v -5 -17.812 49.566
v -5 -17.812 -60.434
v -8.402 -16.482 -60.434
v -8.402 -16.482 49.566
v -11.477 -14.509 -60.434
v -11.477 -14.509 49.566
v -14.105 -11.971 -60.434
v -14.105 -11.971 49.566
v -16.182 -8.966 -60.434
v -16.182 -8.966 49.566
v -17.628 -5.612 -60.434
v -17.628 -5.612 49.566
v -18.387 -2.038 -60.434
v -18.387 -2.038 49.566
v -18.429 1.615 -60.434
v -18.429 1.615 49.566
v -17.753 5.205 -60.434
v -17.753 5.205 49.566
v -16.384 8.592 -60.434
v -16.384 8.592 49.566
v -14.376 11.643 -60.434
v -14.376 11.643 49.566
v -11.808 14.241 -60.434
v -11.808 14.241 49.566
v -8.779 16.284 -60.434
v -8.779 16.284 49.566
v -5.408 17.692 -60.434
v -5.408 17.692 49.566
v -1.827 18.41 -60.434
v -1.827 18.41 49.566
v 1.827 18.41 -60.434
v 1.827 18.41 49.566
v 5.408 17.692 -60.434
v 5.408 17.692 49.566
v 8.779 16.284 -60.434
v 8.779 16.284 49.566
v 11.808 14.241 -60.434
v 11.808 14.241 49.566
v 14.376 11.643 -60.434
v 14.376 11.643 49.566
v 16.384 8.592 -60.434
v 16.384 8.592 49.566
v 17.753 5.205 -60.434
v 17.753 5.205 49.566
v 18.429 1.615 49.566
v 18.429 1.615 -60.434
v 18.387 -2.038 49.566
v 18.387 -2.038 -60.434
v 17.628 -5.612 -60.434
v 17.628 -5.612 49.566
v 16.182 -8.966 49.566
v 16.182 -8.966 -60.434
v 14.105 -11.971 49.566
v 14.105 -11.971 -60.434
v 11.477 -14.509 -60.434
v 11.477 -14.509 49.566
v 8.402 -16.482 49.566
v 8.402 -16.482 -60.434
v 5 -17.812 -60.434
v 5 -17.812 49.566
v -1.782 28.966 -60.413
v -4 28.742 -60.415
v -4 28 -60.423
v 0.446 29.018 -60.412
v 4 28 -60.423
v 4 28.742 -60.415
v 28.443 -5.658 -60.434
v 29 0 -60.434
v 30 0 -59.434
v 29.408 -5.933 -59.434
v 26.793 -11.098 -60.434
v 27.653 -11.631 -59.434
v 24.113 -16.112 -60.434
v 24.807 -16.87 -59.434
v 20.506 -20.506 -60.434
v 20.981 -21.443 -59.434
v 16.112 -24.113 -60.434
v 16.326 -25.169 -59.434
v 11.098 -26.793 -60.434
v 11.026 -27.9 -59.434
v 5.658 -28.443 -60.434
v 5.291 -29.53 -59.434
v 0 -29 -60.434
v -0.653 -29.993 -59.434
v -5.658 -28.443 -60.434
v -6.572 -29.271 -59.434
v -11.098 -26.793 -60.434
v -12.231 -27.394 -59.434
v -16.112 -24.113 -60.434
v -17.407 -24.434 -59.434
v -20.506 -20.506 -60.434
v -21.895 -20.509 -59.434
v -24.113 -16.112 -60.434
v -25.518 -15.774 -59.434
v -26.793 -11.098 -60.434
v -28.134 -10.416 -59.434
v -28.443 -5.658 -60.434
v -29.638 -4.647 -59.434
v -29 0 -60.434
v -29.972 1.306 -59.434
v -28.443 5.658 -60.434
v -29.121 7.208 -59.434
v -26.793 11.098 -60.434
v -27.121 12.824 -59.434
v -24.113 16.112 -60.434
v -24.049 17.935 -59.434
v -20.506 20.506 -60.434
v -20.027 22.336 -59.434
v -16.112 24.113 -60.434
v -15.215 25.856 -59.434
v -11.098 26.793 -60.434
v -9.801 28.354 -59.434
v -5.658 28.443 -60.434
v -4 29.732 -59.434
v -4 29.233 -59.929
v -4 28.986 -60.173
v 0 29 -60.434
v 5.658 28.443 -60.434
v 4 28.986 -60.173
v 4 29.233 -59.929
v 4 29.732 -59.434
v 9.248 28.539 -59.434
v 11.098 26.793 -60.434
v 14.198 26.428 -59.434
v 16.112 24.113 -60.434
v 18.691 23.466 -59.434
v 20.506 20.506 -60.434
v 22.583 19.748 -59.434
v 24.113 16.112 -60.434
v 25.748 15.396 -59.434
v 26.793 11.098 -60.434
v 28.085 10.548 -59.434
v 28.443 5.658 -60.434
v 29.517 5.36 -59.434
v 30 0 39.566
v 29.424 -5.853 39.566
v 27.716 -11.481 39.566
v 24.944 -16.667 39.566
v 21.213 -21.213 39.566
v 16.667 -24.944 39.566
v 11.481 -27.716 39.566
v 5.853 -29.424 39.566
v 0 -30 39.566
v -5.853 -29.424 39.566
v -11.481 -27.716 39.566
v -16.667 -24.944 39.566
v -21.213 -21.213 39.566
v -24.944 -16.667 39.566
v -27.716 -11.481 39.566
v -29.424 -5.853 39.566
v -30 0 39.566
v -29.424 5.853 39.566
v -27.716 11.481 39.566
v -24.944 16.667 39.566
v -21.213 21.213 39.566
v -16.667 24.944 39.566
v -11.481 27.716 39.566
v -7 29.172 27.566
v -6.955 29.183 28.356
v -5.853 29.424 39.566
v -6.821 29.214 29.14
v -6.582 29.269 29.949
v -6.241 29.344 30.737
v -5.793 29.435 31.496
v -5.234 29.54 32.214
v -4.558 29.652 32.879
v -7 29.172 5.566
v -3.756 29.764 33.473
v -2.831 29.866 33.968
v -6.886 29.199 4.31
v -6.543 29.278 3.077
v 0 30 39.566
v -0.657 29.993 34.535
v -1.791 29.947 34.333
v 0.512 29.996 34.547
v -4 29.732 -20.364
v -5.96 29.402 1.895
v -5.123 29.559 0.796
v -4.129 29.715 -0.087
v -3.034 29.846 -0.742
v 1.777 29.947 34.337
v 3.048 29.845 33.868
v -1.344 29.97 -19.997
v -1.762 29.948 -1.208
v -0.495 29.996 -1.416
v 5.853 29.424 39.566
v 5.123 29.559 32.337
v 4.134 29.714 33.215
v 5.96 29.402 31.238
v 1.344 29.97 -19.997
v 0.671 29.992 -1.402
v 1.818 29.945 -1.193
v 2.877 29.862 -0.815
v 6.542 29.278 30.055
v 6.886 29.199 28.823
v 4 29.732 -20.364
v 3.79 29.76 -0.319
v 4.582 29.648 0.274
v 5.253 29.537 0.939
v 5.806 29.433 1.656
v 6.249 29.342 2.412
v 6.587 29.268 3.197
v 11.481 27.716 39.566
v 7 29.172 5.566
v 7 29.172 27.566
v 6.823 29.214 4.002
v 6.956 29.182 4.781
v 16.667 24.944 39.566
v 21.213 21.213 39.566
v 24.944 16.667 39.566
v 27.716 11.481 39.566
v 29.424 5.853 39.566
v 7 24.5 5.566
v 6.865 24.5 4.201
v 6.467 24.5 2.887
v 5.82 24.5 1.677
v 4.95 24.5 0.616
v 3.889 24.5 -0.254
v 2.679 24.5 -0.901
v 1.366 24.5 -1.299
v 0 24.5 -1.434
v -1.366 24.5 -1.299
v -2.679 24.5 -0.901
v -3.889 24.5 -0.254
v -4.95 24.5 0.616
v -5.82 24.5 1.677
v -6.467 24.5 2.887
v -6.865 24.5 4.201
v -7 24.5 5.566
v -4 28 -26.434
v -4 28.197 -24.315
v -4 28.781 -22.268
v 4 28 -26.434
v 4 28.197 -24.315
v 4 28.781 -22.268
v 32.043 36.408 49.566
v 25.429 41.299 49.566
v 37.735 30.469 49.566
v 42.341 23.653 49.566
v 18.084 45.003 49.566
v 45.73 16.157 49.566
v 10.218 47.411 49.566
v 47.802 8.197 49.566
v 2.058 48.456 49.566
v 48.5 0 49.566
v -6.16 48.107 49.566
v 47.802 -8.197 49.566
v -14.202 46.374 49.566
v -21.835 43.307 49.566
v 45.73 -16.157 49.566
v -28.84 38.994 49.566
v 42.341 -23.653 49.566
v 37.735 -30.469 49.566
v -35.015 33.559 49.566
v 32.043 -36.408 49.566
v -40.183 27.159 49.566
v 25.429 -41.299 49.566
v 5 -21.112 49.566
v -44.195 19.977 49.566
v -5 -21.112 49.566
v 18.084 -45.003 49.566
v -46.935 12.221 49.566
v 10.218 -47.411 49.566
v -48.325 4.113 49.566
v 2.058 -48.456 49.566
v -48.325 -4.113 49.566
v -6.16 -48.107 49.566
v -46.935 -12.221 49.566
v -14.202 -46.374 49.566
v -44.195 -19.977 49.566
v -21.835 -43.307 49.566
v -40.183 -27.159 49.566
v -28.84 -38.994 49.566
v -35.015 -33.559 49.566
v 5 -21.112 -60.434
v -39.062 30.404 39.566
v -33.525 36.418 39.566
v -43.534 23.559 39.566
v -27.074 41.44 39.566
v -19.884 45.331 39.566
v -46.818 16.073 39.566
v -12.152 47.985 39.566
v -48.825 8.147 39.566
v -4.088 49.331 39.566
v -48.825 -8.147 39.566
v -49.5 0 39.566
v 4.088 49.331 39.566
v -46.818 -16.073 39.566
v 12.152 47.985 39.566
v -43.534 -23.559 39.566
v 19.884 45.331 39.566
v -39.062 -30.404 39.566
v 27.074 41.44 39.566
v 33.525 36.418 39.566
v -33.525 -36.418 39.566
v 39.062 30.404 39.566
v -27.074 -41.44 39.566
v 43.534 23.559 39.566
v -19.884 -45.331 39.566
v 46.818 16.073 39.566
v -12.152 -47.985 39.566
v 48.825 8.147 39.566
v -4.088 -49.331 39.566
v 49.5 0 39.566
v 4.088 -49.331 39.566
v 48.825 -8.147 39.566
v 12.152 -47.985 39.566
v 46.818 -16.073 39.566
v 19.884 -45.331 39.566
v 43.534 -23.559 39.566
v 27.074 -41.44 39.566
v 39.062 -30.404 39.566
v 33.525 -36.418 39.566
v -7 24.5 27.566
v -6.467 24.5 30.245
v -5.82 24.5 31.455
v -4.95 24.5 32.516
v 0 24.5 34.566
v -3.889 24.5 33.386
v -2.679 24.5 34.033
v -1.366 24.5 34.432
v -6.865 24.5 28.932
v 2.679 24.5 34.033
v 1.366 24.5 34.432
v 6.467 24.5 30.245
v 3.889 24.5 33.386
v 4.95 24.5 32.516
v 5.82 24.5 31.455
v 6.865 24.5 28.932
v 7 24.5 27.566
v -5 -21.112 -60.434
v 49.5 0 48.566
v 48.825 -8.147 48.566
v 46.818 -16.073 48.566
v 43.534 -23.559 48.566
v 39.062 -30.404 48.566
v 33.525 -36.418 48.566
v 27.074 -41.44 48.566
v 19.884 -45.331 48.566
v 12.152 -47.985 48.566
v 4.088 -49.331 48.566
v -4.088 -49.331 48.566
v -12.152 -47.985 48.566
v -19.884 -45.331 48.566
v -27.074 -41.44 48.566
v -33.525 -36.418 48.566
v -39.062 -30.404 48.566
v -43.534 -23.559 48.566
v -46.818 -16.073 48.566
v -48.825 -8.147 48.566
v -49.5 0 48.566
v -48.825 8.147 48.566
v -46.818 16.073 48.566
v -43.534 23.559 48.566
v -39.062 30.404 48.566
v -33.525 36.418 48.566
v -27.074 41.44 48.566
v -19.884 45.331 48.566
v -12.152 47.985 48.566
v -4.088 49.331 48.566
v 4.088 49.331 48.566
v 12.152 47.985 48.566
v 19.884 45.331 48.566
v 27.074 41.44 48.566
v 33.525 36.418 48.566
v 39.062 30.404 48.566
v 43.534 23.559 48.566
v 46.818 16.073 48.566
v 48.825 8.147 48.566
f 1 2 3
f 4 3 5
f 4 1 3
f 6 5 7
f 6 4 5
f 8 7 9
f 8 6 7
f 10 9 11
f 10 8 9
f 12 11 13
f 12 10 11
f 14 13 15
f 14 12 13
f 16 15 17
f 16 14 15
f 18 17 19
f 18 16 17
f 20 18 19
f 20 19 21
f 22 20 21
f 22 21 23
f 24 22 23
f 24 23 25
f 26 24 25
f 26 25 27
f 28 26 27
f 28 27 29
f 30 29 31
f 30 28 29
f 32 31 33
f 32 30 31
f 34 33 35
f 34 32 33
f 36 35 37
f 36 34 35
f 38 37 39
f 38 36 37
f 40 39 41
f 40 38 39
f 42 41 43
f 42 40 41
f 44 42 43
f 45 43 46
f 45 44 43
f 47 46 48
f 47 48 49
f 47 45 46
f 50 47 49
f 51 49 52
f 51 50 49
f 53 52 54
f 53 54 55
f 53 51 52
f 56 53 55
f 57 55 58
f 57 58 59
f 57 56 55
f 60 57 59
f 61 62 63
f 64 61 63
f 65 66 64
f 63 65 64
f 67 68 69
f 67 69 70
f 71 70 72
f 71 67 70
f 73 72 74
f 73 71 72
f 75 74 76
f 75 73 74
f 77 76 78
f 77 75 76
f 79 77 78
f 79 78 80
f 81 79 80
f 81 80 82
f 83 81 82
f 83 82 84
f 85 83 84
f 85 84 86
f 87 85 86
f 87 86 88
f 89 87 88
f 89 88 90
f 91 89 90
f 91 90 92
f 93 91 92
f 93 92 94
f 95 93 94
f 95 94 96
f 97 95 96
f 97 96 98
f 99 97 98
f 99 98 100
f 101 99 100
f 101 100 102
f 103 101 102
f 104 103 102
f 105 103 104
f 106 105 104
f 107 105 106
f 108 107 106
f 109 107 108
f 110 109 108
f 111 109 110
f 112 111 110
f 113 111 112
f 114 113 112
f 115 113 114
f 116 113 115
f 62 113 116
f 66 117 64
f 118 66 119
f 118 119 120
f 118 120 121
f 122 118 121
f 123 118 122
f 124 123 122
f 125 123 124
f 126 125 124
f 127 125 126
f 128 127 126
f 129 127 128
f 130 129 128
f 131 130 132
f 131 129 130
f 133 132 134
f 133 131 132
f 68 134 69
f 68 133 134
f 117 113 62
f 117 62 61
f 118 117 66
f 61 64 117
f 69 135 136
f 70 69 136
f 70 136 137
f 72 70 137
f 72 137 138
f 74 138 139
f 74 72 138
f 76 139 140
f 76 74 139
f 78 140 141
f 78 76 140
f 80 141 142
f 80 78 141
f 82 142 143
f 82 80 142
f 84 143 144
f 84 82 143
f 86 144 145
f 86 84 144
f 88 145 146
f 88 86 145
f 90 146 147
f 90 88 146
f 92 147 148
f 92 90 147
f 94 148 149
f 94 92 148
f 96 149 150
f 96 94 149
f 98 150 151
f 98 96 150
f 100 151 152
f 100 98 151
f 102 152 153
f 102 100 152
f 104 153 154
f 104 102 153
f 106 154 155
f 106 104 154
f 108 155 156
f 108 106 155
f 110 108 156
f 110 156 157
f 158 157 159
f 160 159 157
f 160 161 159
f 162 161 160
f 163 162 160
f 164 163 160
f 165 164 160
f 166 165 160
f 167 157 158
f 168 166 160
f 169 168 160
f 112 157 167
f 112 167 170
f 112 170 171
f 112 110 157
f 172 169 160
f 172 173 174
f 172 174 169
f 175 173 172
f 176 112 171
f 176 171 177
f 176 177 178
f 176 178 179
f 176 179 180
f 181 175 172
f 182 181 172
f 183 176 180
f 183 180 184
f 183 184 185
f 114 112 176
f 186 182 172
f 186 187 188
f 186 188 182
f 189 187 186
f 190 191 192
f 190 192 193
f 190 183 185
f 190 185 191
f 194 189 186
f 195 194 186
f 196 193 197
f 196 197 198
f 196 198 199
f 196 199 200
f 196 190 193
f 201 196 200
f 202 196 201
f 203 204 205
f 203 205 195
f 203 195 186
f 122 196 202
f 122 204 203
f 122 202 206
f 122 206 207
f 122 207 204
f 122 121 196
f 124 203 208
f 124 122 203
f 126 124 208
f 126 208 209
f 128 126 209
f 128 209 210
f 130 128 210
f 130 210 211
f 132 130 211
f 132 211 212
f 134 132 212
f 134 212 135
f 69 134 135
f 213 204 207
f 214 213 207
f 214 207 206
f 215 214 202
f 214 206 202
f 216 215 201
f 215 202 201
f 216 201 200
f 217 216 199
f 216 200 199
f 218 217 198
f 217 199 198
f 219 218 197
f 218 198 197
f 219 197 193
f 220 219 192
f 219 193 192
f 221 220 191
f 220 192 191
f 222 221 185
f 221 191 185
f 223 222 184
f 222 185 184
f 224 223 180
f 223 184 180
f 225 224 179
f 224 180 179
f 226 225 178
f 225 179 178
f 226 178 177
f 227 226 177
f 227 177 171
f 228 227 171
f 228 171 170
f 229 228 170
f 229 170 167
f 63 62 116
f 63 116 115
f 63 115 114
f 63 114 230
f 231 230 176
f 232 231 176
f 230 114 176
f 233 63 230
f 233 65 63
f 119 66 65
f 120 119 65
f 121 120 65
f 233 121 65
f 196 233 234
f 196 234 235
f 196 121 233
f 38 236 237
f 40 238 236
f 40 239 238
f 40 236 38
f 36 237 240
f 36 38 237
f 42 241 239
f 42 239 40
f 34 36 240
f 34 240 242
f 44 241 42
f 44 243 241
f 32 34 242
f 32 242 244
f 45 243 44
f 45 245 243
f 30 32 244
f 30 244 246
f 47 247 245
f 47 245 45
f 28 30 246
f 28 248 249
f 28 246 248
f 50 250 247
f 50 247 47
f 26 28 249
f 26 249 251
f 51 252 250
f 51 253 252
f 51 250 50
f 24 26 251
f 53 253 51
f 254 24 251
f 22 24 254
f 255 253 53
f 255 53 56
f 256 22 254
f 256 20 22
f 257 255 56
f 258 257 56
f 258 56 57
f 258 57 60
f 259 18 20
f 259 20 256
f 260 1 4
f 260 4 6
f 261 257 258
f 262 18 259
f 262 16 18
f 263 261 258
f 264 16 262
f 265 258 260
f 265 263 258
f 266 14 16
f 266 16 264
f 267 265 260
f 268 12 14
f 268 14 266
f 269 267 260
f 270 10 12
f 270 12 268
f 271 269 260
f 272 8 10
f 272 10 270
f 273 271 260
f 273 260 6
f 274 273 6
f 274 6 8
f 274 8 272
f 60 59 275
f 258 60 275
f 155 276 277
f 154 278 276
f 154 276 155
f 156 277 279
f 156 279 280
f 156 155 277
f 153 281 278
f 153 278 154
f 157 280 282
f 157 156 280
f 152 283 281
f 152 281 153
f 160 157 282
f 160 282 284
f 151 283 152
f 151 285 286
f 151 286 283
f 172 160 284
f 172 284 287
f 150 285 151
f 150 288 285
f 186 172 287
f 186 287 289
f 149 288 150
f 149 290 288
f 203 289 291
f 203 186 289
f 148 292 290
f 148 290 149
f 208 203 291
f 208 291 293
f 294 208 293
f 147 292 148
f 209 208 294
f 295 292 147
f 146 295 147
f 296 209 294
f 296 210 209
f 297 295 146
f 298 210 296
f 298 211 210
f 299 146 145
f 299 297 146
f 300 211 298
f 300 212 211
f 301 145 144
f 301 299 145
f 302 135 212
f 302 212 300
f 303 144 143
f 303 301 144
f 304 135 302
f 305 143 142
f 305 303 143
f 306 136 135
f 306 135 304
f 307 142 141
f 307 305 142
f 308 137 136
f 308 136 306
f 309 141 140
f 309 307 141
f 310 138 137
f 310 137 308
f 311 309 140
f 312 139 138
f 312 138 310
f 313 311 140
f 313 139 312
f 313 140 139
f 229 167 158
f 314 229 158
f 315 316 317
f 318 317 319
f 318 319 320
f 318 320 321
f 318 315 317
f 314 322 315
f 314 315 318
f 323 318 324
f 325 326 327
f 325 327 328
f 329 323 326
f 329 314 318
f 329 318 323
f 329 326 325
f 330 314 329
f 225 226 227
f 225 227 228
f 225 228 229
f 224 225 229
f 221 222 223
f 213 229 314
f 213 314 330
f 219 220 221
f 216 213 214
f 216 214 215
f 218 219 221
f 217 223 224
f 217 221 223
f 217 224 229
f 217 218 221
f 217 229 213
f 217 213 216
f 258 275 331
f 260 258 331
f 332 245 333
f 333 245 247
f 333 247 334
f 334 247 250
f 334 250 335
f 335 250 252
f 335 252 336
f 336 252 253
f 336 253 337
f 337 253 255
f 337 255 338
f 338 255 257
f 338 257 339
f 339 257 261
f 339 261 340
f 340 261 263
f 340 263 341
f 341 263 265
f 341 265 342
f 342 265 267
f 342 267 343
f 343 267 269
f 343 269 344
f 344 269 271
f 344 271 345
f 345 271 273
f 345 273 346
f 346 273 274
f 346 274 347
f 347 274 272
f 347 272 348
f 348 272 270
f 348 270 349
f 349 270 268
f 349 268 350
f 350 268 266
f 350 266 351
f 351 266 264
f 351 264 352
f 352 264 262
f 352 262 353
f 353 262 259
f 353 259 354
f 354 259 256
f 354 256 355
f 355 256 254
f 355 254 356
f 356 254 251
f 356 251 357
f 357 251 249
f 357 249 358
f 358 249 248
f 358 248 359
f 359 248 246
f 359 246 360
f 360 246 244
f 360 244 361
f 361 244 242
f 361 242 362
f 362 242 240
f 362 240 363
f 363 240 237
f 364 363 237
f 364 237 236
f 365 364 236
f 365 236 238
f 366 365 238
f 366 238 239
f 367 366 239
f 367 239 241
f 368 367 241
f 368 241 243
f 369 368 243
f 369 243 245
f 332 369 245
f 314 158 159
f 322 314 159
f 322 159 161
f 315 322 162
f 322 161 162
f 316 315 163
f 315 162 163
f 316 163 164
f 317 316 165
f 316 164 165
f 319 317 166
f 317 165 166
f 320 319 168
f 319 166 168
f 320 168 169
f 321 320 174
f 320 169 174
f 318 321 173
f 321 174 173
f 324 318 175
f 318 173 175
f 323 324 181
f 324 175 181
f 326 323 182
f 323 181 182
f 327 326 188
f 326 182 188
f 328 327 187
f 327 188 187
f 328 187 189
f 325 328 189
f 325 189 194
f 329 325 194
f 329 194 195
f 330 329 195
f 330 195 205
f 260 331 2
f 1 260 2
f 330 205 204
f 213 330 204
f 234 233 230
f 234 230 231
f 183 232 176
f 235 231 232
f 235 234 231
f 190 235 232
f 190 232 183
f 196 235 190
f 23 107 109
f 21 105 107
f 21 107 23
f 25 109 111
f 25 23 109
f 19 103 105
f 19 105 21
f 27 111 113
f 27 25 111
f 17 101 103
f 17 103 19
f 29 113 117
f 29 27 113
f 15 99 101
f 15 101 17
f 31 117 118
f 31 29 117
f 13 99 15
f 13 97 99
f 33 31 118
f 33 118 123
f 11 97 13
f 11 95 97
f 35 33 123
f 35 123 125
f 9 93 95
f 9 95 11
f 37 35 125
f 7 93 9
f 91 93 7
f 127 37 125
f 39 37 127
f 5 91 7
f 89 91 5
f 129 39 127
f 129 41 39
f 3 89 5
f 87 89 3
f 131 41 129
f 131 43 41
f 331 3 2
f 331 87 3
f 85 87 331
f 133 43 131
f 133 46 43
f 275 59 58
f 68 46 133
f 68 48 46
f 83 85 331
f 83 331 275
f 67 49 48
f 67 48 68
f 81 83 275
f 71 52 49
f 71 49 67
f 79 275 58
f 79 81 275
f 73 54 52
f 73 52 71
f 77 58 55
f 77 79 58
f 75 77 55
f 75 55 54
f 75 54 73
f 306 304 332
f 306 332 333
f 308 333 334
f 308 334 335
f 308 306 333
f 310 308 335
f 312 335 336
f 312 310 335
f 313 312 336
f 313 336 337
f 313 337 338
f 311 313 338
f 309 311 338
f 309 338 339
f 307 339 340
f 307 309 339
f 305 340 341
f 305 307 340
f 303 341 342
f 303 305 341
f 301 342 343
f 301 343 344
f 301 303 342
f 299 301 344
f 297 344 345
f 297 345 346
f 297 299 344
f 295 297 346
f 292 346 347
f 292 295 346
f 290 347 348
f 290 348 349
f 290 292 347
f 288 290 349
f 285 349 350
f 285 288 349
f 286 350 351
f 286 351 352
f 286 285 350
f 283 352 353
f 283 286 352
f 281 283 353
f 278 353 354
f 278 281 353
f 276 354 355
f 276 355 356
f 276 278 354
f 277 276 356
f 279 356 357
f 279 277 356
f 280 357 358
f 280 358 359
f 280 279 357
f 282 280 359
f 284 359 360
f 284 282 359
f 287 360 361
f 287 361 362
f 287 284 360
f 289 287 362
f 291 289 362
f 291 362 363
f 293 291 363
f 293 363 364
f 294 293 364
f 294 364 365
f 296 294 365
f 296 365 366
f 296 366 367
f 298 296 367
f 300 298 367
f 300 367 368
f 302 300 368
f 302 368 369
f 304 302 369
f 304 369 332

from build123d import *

# Parameters (mm, degrees)
TAGLIO_ESTRUSIONE1_DEPTH = 131.385965502
TAGLIO_ESTRUSIONE5_DEPTH = 5.5
SMUSSO1_SIZE             = 1
TAGLIO_ESTRUSIONE6_DEPTH = 4


with BuildPart() as part:
    # Schizzo1 → Rivoluzione1 (revolve)
    with BuildSketch(Plane(origin=(0, 0, 0), x_dir=(0, 0, -1), z_dir=(1, 0, 0)), mode=Mode.PRIVATE) as rivoluzione1_sk:
        Polygon((-49.566192487, 49.5), (-39.566192487, 49.5), (-39.566192487, 30), (60.433807513, 30), (60.433807513, 18.5), (-49.566192487, 18.5), align=None)
    revolve(rivoluzione1_sk.sketch.rotate(Axis((0, 0, 106.615161212), (0, 0, -1)), 90), axis=Axis((0, 0, 106.615161212), (0, 0, -1)))

    # Schizzo2 → Taglio-Estrusione1 (cut, through all)
    with BuildSketch(Plane(origin=(0, 0, -60.433807513), x_dir=(-1, 0, 0), z_dir=(0, 0, -1))):
        with BuildLine():
            ThreePointArc((0, -18.5), (-2.523589416, -18.327070046), (-5, -17.811513131))
            Line((-5, -17.811513131), (-5, -21.111513131))
            Line((-5, -21.111513131), (0, -21.111513131))
            Line((0, -21.111513131), (0, -18.5))
        make_face()
        with BuildLine():
            ThreePointArc((5, -17.811513131), (2.523589416, -18.327070046), (0, -18.5))
            Line((0, -18.5), (0, -21.111513131))
            Line((0, -21.111513131), (5, -21.111513131))
            Line((5, -21.111513131), (5, -17.811513131))
        make_face()
    extrude(amount=-TAGLIO_ESTRUSIONE1_DEPTH, mode=Mode.SUBTRACT)

    # Schizzo5 → Taglio-Estrusione5 (cut)
    with BuildSketch(Plane(origin=(0, 30, 0), x_dir=(-1, 0, 0), z_dir=(0, -1, 0))):
        with BuildLine():
            Line((7, -5.566192487), (7, -27.566192487))
            ThreePointArc((7, -27.566192487), (0, -34.566192487), (-7, -27.566192487))
            Line((-7, -27.566192487), (-7, -5.566192487))
            ThreePointArc((-7, -5.566192487), (0, 1.433807513), (7, -5.566192487))
        make_face()
    extrude(amount=TAGLIO_ESTRUSIONE5_DEPTH, mode=Mode.SUBTRACT)

    # Smusso1
    smusso1_edges = [part.edges().sort_by_distance(p)[0] for p in [
        (-30, 0, -60.433807513),
        (-49.5, 0, 49.566192487),
    ]]
    chamfer(smusso1_edges, length=SMUSSO1_SIZE)

    # Schizzo7 → Taglio-Estrusione6 (cut, symmetric)
    with BuildSketch(Plane(origin=(0, 0, 0), x_dir=(0, 0, -1), z_dir=(1, 0, 0))):
        with BuildLine():
            Line((26.433807513, 51), (60.190248372, 51))
            Line((60.190248372, 51), (60.422535475, 28))
            Line((60.422535475, 28), (26.433807513, 28))
            ThreePointArc((26.433807513, 28), (14.933807513, 39.5), (26.433807513, 51))
        make_face()
    extrude(amount=TAGLIO_ESTRUSIONE6_DEPTH, both=True, mode=Mode.SUBTRACT)


solid = part.part
